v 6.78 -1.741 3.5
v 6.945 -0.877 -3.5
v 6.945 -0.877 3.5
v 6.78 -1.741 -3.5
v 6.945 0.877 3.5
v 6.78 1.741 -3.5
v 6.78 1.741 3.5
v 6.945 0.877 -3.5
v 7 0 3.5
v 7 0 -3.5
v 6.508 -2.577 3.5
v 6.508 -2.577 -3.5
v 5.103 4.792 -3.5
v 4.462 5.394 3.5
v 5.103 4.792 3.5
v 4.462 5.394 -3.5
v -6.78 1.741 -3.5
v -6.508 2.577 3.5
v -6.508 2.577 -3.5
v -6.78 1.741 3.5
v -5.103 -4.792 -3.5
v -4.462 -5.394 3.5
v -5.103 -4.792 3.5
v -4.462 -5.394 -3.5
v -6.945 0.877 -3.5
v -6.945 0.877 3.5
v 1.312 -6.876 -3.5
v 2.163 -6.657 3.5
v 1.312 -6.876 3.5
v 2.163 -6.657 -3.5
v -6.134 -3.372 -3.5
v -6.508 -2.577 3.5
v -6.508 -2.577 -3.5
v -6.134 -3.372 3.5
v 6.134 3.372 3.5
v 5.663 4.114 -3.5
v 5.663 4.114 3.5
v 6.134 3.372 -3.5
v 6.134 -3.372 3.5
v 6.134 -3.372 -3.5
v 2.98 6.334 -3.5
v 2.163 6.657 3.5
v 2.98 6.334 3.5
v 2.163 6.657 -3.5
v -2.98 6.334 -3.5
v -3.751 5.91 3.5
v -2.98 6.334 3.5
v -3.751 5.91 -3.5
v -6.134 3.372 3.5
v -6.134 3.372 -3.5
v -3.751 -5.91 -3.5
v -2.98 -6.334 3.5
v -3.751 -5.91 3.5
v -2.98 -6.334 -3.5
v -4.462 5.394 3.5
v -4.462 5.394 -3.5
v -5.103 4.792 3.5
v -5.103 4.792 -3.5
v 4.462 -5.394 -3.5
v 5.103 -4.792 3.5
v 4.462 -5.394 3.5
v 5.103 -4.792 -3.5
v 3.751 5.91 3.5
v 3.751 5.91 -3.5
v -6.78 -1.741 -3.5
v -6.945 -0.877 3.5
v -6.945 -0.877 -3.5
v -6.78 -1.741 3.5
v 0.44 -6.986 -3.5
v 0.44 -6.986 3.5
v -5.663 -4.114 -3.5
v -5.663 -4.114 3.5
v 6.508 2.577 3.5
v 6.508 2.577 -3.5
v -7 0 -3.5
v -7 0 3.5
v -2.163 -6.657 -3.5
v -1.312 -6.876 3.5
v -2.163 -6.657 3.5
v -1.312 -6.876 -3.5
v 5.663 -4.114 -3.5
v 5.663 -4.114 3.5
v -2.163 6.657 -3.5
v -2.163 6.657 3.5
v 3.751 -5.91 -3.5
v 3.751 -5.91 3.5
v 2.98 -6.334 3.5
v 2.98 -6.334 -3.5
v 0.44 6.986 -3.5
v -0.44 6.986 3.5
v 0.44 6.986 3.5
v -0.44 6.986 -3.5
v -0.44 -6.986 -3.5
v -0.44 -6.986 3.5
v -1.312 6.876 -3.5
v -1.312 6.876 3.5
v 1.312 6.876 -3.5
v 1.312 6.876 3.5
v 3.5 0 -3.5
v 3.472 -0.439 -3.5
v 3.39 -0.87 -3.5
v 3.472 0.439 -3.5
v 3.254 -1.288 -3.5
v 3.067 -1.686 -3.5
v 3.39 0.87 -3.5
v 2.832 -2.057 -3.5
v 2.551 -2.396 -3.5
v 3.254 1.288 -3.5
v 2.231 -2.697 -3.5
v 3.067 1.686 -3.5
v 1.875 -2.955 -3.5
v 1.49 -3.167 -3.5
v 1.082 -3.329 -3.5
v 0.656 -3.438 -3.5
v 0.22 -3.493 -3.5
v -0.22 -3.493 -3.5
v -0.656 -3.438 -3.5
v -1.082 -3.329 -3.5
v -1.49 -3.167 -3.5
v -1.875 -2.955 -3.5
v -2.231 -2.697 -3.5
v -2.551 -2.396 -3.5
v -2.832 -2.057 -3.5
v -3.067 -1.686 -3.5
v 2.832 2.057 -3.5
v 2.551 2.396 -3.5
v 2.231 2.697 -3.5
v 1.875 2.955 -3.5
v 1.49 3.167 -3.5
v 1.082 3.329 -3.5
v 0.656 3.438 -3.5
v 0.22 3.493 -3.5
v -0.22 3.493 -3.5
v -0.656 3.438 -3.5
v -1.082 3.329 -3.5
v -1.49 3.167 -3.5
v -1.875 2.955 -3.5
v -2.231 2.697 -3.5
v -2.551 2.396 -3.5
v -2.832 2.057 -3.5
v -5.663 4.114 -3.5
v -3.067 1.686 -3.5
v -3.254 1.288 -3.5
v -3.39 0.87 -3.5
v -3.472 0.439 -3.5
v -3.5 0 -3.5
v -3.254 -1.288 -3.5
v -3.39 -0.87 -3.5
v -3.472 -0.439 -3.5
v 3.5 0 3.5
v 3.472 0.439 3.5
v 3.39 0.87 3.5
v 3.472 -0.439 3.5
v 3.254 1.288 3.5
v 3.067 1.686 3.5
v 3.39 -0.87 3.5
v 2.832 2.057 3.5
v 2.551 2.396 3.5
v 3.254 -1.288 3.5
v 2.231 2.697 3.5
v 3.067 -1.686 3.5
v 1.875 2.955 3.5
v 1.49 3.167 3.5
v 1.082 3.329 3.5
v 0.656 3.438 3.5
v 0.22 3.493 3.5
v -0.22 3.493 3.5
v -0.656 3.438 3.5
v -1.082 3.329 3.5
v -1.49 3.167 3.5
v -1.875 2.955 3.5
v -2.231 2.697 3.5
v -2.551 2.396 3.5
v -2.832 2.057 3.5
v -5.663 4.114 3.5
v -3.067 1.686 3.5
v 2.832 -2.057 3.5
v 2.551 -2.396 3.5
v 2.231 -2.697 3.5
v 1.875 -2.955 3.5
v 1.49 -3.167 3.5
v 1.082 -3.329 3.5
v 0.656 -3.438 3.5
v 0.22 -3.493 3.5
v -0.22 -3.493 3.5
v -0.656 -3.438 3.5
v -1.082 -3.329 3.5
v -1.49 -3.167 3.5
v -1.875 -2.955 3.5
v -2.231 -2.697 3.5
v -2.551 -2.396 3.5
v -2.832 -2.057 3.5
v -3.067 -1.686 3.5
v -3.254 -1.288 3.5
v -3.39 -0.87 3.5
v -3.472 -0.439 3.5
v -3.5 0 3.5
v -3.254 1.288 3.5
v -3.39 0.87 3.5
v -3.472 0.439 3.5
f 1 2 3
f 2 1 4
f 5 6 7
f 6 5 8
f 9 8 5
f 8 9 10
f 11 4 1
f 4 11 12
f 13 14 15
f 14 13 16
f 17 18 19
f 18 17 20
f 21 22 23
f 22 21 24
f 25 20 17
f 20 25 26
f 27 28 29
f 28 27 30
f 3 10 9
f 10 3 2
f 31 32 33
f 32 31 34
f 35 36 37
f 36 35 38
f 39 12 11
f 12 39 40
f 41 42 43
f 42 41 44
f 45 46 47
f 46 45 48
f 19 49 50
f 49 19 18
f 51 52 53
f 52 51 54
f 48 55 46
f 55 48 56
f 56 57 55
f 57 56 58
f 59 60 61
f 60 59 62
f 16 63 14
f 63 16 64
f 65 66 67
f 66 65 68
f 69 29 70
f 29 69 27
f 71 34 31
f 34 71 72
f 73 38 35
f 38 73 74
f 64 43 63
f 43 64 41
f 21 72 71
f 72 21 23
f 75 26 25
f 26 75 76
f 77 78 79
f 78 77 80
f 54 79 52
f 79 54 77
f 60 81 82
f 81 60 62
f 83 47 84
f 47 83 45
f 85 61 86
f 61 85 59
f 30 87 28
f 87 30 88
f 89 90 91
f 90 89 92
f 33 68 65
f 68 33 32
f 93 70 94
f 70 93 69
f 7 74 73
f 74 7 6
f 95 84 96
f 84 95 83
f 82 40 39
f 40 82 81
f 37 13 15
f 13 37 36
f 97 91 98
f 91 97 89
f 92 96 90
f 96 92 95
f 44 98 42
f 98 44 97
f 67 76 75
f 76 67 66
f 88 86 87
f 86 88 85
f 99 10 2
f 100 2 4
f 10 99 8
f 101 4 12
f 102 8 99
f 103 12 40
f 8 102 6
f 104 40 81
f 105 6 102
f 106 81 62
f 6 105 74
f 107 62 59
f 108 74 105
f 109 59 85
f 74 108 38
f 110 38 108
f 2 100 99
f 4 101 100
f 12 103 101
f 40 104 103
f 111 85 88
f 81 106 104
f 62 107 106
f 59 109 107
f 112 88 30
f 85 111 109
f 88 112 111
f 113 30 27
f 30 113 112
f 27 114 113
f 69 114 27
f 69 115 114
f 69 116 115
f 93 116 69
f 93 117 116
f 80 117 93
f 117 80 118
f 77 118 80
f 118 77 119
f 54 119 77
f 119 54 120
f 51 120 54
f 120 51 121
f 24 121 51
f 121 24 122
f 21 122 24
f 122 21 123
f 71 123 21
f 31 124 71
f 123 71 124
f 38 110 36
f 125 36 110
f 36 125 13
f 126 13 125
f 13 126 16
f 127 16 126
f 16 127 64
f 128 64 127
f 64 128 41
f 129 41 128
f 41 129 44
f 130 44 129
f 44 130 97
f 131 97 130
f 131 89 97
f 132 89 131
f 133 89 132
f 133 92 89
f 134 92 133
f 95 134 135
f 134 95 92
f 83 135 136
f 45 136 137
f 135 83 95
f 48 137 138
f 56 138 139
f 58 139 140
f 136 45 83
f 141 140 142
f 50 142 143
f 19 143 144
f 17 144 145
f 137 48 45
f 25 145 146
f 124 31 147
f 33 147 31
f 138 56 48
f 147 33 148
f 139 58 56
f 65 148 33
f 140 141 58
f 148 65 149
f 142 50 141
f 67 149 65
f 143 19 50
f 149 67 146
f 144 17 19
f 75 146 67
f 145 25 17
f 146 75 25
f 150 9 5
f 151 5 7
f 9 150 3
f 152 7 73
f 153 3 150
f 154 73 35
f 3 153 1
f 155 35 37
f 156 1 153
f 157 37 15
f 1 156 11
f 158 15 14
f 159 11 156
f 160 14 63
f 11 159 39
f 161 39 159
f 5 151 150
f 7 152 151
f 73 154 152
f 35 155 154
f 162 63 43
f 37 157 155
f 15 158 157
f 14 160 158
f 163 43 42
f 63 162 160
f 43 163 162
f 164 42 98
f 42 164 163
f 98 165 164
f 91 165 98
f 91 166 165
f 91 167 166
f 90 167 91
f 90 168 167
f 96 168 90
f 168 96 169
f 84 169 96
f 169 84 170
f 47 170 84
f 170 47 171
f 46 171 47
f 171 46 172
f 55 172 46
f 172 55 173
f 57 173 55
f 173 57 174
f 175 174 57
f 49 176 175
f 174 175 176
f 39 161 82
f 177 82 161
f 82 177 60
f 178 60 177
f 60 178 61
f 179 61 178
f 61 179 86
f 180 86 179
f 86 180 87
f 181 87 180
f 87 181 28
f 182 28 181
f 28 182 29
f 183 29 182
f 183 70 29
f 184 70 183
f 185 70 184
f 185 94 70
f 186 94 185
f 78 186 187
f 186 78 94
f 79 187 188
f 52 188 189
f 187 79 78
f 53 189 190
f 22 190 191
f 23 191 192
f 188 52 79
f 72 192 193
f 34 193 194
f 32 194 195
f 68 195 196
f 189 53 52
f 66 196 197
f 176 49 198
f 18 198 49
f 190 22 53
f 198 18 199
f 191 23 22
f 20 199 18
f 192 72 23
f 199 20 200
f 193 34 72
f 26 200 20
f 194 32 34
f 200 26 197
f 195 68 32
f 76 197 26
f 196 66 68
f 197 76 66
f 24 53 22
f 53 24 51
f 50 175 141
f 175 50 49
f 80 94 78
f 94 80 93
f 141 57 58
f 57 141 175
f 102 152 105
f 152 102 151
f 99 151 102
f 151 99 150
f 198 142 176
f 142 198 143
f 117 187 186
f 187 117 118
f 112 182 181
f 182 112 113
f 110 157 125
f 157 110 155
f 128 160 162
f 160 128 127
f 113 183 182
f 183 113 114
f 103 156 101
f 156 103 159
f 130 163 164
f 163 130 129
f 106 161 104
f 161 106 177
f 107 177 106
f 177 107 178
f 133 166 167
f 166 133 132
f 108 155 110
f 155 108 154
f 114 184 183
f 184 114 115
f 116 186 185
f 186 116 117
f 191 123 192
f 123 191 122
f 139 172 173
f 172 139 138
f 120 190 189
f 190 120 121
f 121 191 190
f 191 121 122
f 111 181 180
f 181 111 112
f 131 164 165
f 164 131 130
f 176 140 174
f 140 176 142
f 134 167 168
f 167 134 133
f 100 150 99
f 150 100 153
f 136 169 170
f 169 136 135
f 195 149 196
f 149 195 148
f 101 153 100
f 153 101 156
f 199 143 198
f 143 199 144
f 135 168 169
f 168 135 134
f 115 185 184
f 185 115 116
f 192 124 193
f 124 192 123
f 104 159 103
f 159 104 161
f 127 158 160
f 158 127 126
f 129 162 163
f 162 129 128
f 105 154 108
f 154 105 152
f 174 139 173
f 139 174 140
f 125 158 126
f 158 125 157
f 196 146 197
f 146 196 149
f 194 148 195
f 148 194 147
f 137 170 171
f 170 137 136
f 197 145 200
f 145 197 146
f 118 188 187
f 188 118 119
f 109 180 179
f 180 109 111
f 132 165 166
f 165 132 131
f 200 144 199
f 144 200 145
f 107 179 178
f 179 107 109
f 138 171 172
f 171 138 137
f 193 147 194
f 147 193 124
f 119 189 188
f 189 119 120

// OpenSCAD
$fn = 50;


difference() {
	union() {
		translate(v = [0, 0, -3.5000000000]) {
			cylinder(h = 7, r = 7.0000000000);
		}
	}
	union() {
		translate(v = [0, 0, -100.0000000000]) {
			cylinder(h = 200, r = 3.5000000000);
		}
	}
}
